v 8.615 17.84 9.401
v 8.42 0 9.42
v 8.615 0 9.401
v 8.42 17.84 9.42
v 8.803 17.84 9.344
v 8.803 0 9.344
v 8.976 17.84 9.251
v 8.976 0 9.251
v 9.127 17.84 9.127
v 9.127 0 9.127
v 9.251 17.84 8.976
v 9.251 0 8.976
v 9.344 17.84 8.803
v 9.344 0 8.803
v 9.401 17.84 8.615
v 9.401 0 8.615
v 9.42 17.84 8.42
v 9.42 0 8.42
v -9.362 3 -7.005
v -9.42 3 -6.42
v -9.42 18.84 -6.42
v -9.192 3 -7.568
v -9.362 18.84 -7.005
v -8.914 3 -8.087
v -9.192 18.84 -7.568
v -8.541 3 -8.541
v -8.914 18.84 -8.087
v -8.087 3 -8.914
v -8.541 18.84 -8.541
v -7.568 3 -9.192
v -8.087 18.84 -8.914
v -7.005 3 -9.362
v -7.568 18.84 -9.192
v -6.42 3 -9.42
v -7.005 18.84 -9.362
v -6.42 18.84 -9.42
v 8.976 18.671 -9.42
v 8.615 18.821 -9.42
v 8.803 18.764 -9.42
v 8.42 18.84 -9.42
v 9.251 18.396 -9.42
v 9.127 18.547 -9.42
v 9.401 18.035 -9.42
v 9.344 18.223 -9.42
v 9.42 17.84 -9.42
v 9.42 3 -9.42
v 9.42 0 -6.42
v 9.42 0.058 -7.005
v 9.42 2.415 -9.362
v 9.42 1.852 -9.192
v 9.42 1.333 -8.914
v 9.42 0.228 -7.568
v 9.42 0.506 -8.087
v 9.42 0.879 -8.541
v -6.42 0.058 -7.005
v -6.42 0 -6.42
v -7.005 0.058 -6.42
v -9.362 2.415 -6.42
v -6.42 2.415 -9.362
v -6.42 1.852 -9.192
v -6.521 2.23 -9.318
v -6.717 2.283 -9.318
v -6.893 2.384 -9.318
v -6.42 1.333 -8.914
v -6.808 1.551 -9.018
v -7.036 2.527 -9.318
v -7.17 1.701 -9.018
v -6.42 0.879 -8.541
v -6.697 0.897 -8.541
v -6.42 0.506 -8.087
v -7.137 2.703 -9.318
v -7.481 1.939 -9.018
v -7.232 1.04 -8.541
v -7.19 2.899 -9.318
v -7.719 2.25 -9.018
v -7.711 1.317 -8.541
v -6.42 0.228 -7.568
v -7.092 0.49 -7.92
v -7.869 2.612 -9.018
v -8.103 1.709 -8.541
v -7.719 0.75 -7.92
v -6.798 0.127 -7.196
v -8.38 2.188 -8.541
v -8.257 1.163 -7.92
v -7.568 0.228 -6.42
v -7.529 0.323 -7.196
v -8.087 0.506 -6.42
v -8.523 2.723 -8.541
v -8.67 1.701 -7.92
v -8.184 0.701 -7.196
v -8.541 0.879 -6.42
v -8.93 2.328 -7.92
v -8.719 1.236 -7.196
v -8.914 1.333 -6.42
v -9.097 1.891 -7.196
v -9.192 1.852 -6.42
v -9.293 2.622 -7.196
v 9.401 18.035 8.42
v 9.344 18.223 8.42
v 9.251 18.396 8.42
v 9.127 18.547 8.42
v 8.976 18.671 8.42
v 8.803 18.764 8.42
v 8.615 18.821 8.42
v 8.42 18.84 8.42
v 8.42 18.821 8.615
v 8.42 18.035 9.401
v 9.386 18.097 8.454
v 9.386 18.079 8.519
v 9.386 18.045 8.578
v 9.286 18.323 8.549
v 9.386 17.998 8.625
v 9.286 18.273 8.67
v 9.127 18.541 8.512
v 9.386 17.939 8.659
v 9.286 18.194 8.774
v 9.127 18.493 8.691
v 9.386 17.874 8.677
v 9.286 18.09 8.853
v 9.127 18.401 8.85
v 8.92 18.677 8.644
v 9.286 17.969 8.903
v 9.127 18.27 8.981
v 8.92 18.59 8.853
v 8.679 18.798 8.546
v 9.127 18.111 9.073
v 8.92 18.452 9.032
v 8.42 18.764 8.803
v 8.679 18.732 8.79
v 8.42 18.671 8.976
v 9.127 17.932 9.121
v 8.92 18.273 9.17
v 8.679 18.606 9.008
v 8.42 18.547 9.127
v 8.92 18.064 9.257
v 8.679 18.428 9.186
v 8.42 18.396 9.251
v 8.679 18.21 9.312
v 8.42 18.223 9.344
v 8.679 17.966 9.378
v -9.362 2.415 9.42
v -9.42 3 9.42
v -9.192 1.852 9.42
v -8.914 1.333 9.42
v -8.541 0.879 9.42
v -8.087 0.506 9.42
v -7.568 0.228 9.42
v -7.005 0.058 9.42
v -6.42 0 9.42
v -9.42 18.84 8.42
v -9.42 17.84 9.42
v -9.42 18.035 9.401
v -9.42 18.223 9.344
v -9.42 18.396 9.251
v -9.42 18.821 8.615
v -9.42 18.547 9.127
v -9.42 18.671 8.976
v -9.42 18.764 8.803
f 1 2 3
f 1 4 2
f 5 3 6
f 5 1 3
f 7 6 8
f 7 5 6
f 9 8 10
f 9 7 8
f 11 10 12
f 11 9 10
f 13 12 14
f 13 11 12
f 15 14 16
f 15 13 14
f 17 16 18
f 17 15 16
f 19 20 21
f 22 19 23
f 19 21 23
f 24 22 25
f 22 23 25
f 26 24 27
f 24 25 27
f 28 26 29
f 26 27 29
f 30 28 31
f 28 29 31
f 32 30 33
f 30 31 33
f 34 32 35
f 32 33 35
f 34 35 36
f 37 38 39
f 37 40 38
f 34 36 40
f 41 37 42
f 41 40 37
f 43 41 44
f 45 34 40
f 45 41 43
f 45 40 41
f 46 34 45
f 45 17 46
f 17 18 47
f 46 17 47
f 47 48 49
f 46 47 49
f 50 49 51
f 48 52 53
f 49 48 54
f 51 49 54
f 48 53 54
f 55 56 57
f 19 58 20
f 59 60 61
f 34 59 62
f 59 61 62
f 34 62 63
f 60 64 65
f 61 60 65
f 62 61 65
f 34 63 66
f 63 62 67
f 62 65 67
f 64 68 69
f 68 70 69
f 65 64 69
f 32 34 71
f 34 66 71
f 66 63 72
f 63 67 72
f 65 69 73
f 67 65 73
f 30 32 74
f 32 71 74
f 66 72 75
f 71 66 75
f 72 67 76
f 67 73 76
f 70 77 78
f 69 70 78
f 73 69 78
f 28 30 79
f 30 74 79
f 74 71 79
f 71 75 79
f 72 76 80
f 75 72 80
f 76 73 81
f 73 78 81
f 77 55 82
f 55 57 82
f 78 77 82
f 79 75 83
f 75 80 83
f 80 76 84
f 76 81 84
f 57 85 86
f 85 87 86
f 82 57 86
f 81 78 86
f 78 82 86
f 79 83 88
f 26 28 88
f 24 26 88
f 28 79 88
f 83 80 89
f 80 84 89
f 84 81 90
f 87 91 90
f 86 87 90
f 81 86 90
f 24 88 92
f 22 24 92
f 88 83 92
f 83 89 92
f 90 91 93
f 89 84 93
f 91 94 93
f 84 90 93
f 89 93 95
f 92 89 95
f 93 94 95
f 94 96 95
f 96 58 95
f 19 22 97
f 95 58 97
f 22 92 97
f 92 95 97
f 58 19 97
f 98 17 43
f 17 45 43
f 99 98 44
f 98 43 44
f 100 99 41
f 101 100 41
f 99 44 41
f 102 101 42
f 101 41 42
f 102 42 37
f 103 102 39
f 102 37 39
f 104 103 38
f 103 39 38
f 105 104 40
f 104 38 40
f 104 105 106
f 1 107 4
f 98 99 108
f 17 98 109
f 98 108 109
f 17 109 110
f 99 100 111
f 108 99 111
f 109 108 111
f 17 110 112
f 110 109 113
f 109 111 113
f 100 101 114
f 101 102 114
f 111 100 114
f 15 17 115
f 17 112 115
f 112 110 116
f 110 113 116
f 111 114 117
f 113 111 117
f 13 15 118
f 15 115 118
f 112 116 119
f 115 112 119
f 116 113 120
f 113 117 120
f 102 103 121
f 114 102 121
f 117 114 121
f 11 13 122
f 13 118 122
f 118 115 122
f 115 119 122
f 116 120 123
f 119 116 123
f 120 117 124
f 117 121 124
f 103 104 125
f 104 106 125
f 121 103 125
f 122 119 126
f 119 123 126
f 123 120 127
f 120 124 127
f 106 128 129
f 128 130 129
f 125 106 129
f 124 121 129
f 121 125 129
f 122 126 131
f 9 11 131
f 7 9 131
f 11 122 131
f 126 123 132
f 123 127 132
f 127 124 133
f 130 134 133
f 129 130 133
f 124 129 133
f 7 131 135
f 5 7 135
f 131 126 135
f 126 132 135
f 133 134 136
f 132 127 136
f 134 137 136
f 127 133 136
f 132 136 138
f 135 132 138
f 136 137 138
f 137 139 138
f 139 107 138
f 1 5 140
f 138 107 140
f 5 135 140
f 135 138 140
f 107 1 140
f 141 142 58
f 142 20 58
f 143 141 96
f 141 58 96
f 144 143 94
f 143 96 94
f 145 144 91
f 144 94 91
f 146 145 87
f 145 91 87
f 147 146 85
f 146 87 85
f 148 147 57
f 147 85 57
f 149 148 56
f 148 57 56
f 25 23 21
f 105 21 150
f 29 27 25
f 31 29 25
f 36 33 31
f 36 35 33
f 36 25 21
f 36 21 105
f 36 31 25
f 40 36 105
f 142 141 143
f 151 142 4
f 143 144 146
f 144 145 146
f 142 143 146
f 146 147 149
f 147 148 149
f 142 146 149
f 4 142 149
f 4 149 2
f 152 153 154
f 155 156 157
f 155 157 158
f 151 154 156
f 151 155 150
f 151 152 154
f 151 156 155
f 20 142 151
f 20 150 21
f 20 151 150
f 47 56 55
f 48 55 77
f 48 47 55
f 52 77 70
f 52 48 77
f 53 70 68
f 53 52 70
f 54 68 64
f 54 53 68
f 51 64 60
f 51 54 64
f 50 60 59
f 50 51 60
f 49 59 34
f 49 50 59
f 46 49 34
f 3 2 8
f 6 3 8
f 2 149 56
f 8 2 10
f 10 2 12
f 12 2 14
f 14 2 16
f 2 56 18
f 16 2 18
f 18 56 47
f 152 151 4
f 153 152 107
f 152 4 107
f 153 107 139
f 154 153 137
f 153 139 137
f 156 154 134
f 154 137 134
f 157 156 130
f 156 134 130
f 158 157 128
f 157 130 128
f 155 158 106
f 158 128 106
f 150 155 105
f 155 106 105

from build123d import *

# Parameters (mm, degrees)
SKETCH_1_W      = 18.84
SKETCH_1_H      = 18.84
EXTRUDE_1_DEPTH = 18.84
FILLET_1_R      = 1
FILLET_2_R      = 3


with BuildPart() as part:
    # 草图1 → 凸台-拉伸1 (new body)
    with BuildSketch(Plane(origin=(0, 0, 0), x_dir=(1, 0, 0), z_dir=(0, 1, 0))):
        Rectangle(SKETCH_1_W, SKETCH_1_H)
    extrude(amount=EXTRUDE_1_DEPTH)

    # 圆角1
    fillet_1_edges = [part.edges().sort_by_distance(p)[0] for p in [
        (0, 18.84, 9.42),
        (9.42, 18.84, 0),
        (9.42, 9.42, 9.42),
    ]]
    fillet(fillet_1_edges, radius=FILLET_1_R)

    # 圆角2
    fillet_2_edges = [part.edges().sort_by_distance(p)[0] for p in [
        (-9.42, 0, 0),
        (0, 0, -9.42),
        (-9.42, 9.42, -9.42),
    ]]
    fillet(fillet_2_edges, radius=FILLET_2_R)


solid = part.part
